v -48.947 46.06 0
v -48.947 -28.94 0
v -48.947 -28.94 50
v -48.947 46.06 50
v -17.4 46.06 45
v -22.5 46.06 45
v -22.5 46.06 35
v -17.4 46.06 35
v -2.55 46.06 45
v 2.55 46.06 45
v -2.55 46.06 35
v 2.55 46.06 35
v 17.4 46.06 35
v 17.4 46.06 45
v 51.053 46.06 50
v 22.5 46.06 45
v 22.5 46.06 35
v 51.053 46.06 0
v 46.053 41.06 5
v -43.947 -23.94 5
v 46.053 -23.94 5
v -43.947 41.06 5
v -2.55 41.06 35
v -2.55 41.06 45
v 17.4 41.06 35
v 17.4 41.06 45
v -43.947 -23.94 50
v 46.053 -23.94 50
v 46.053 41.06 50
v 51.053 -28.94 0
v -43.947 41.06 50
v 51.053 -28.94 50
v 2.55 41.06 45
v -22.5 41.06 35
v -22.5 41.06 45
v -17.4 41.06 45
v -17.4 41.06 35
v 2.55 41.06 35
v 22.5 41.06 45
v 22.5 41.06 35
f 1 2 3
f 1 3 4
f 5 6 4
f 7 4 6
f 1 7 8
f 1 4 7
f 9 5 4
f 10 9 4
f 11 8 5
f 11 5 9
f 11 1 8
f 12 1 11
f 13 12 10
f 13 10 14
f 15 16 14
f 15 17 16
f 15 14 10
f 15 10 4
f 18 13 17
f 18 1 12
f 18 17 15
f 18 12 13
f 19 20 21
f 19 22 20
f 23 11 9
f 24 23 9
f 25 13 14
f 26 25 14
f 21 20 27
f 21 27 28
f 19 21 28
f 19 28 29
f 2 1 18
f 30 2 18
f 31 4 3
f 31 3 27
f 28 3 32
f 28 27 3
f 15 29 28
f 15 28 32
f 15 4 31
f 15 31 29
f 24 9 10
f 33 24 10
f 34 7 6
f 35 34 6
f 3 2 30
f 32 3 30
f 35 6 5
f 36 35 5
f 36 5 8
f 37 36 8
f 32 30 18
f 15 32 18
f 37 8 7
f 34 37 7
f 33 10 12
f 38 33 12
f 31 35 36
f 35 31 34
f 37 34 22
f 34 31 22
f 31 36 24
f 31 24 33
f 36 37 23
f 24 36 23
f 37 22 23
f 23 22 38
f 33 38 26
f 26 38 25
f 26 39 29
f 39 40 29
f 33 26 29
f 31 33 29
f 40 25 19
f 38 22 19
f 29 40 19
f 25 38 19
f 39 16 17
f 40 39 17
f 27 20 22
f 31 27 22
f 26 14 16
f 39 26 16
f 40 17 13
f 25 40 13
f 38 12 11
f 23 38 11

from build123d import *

# Parameters (mm, degrees)
F1_W     = 100
F1_H     = 75
F1_W_2   = 90
F1_H_2   = 65
F2_DEPTH = 5
F3_DEPTH = 50
F5_DEPTH = 5


with BuildPart() as f2:
    # F1 (on face) → F2 (new body)
    with BuildSketch(Plane.XY):
        with Locations((1.0527614504, 8.5603988189)):
            Rectangle(F1_W, F1_H)
        with Locations((1.0527614504, 8.5603988189)):
            Rectangle(F1_W_2, F1_H_2, mode=Mode.SUBTRACT)
        with Locations((1.0527614504, 8.5603988189)):
            Rectangle(F1_W_2, F1_H_2)
    extrude(amount=F2_DEPTH)

    # F1 (on face) → F3 (join)
    with BuildSketch(Plane.XY):
        with Locations((1.0527614504, 8.5603988189)):
            Rectangle(F1_W, F1_H)
        with Locations((1.0527614504, 8.5603988189)):
            Rectangle(F1_W_2, F1_H_2, mode=Mode.SUBTRACT)
    extrude(amount=F3_DEPTH)

    # F4 (on face) → F5 (cut)
    with BuildSketch(Plane(origin=(0, 46.0603988189, 0), x_dir=(-1, 0, 0), z_dir=(0, 1, 0))):
        Polygon((-17.4, 45), (-22.5, 45), (-22.5, 40), (-22.5, 35), (-17.4, 35), (-17.4, 40), align=None)
        Polygon((2.55, 45), (-2.55, 45), (-2.55, 40), (-2.55, 35), (2.55, 35), (2.55, 40), align=None)
        Polygon((22.5, 45), (17.4, 45), (17.4, 40), (17.4, 35), (22.5, 35), align=None)
    extrude(amount=-F5_DEPTH, mode=Mode.SUBTRACT)


solid = f2.part
